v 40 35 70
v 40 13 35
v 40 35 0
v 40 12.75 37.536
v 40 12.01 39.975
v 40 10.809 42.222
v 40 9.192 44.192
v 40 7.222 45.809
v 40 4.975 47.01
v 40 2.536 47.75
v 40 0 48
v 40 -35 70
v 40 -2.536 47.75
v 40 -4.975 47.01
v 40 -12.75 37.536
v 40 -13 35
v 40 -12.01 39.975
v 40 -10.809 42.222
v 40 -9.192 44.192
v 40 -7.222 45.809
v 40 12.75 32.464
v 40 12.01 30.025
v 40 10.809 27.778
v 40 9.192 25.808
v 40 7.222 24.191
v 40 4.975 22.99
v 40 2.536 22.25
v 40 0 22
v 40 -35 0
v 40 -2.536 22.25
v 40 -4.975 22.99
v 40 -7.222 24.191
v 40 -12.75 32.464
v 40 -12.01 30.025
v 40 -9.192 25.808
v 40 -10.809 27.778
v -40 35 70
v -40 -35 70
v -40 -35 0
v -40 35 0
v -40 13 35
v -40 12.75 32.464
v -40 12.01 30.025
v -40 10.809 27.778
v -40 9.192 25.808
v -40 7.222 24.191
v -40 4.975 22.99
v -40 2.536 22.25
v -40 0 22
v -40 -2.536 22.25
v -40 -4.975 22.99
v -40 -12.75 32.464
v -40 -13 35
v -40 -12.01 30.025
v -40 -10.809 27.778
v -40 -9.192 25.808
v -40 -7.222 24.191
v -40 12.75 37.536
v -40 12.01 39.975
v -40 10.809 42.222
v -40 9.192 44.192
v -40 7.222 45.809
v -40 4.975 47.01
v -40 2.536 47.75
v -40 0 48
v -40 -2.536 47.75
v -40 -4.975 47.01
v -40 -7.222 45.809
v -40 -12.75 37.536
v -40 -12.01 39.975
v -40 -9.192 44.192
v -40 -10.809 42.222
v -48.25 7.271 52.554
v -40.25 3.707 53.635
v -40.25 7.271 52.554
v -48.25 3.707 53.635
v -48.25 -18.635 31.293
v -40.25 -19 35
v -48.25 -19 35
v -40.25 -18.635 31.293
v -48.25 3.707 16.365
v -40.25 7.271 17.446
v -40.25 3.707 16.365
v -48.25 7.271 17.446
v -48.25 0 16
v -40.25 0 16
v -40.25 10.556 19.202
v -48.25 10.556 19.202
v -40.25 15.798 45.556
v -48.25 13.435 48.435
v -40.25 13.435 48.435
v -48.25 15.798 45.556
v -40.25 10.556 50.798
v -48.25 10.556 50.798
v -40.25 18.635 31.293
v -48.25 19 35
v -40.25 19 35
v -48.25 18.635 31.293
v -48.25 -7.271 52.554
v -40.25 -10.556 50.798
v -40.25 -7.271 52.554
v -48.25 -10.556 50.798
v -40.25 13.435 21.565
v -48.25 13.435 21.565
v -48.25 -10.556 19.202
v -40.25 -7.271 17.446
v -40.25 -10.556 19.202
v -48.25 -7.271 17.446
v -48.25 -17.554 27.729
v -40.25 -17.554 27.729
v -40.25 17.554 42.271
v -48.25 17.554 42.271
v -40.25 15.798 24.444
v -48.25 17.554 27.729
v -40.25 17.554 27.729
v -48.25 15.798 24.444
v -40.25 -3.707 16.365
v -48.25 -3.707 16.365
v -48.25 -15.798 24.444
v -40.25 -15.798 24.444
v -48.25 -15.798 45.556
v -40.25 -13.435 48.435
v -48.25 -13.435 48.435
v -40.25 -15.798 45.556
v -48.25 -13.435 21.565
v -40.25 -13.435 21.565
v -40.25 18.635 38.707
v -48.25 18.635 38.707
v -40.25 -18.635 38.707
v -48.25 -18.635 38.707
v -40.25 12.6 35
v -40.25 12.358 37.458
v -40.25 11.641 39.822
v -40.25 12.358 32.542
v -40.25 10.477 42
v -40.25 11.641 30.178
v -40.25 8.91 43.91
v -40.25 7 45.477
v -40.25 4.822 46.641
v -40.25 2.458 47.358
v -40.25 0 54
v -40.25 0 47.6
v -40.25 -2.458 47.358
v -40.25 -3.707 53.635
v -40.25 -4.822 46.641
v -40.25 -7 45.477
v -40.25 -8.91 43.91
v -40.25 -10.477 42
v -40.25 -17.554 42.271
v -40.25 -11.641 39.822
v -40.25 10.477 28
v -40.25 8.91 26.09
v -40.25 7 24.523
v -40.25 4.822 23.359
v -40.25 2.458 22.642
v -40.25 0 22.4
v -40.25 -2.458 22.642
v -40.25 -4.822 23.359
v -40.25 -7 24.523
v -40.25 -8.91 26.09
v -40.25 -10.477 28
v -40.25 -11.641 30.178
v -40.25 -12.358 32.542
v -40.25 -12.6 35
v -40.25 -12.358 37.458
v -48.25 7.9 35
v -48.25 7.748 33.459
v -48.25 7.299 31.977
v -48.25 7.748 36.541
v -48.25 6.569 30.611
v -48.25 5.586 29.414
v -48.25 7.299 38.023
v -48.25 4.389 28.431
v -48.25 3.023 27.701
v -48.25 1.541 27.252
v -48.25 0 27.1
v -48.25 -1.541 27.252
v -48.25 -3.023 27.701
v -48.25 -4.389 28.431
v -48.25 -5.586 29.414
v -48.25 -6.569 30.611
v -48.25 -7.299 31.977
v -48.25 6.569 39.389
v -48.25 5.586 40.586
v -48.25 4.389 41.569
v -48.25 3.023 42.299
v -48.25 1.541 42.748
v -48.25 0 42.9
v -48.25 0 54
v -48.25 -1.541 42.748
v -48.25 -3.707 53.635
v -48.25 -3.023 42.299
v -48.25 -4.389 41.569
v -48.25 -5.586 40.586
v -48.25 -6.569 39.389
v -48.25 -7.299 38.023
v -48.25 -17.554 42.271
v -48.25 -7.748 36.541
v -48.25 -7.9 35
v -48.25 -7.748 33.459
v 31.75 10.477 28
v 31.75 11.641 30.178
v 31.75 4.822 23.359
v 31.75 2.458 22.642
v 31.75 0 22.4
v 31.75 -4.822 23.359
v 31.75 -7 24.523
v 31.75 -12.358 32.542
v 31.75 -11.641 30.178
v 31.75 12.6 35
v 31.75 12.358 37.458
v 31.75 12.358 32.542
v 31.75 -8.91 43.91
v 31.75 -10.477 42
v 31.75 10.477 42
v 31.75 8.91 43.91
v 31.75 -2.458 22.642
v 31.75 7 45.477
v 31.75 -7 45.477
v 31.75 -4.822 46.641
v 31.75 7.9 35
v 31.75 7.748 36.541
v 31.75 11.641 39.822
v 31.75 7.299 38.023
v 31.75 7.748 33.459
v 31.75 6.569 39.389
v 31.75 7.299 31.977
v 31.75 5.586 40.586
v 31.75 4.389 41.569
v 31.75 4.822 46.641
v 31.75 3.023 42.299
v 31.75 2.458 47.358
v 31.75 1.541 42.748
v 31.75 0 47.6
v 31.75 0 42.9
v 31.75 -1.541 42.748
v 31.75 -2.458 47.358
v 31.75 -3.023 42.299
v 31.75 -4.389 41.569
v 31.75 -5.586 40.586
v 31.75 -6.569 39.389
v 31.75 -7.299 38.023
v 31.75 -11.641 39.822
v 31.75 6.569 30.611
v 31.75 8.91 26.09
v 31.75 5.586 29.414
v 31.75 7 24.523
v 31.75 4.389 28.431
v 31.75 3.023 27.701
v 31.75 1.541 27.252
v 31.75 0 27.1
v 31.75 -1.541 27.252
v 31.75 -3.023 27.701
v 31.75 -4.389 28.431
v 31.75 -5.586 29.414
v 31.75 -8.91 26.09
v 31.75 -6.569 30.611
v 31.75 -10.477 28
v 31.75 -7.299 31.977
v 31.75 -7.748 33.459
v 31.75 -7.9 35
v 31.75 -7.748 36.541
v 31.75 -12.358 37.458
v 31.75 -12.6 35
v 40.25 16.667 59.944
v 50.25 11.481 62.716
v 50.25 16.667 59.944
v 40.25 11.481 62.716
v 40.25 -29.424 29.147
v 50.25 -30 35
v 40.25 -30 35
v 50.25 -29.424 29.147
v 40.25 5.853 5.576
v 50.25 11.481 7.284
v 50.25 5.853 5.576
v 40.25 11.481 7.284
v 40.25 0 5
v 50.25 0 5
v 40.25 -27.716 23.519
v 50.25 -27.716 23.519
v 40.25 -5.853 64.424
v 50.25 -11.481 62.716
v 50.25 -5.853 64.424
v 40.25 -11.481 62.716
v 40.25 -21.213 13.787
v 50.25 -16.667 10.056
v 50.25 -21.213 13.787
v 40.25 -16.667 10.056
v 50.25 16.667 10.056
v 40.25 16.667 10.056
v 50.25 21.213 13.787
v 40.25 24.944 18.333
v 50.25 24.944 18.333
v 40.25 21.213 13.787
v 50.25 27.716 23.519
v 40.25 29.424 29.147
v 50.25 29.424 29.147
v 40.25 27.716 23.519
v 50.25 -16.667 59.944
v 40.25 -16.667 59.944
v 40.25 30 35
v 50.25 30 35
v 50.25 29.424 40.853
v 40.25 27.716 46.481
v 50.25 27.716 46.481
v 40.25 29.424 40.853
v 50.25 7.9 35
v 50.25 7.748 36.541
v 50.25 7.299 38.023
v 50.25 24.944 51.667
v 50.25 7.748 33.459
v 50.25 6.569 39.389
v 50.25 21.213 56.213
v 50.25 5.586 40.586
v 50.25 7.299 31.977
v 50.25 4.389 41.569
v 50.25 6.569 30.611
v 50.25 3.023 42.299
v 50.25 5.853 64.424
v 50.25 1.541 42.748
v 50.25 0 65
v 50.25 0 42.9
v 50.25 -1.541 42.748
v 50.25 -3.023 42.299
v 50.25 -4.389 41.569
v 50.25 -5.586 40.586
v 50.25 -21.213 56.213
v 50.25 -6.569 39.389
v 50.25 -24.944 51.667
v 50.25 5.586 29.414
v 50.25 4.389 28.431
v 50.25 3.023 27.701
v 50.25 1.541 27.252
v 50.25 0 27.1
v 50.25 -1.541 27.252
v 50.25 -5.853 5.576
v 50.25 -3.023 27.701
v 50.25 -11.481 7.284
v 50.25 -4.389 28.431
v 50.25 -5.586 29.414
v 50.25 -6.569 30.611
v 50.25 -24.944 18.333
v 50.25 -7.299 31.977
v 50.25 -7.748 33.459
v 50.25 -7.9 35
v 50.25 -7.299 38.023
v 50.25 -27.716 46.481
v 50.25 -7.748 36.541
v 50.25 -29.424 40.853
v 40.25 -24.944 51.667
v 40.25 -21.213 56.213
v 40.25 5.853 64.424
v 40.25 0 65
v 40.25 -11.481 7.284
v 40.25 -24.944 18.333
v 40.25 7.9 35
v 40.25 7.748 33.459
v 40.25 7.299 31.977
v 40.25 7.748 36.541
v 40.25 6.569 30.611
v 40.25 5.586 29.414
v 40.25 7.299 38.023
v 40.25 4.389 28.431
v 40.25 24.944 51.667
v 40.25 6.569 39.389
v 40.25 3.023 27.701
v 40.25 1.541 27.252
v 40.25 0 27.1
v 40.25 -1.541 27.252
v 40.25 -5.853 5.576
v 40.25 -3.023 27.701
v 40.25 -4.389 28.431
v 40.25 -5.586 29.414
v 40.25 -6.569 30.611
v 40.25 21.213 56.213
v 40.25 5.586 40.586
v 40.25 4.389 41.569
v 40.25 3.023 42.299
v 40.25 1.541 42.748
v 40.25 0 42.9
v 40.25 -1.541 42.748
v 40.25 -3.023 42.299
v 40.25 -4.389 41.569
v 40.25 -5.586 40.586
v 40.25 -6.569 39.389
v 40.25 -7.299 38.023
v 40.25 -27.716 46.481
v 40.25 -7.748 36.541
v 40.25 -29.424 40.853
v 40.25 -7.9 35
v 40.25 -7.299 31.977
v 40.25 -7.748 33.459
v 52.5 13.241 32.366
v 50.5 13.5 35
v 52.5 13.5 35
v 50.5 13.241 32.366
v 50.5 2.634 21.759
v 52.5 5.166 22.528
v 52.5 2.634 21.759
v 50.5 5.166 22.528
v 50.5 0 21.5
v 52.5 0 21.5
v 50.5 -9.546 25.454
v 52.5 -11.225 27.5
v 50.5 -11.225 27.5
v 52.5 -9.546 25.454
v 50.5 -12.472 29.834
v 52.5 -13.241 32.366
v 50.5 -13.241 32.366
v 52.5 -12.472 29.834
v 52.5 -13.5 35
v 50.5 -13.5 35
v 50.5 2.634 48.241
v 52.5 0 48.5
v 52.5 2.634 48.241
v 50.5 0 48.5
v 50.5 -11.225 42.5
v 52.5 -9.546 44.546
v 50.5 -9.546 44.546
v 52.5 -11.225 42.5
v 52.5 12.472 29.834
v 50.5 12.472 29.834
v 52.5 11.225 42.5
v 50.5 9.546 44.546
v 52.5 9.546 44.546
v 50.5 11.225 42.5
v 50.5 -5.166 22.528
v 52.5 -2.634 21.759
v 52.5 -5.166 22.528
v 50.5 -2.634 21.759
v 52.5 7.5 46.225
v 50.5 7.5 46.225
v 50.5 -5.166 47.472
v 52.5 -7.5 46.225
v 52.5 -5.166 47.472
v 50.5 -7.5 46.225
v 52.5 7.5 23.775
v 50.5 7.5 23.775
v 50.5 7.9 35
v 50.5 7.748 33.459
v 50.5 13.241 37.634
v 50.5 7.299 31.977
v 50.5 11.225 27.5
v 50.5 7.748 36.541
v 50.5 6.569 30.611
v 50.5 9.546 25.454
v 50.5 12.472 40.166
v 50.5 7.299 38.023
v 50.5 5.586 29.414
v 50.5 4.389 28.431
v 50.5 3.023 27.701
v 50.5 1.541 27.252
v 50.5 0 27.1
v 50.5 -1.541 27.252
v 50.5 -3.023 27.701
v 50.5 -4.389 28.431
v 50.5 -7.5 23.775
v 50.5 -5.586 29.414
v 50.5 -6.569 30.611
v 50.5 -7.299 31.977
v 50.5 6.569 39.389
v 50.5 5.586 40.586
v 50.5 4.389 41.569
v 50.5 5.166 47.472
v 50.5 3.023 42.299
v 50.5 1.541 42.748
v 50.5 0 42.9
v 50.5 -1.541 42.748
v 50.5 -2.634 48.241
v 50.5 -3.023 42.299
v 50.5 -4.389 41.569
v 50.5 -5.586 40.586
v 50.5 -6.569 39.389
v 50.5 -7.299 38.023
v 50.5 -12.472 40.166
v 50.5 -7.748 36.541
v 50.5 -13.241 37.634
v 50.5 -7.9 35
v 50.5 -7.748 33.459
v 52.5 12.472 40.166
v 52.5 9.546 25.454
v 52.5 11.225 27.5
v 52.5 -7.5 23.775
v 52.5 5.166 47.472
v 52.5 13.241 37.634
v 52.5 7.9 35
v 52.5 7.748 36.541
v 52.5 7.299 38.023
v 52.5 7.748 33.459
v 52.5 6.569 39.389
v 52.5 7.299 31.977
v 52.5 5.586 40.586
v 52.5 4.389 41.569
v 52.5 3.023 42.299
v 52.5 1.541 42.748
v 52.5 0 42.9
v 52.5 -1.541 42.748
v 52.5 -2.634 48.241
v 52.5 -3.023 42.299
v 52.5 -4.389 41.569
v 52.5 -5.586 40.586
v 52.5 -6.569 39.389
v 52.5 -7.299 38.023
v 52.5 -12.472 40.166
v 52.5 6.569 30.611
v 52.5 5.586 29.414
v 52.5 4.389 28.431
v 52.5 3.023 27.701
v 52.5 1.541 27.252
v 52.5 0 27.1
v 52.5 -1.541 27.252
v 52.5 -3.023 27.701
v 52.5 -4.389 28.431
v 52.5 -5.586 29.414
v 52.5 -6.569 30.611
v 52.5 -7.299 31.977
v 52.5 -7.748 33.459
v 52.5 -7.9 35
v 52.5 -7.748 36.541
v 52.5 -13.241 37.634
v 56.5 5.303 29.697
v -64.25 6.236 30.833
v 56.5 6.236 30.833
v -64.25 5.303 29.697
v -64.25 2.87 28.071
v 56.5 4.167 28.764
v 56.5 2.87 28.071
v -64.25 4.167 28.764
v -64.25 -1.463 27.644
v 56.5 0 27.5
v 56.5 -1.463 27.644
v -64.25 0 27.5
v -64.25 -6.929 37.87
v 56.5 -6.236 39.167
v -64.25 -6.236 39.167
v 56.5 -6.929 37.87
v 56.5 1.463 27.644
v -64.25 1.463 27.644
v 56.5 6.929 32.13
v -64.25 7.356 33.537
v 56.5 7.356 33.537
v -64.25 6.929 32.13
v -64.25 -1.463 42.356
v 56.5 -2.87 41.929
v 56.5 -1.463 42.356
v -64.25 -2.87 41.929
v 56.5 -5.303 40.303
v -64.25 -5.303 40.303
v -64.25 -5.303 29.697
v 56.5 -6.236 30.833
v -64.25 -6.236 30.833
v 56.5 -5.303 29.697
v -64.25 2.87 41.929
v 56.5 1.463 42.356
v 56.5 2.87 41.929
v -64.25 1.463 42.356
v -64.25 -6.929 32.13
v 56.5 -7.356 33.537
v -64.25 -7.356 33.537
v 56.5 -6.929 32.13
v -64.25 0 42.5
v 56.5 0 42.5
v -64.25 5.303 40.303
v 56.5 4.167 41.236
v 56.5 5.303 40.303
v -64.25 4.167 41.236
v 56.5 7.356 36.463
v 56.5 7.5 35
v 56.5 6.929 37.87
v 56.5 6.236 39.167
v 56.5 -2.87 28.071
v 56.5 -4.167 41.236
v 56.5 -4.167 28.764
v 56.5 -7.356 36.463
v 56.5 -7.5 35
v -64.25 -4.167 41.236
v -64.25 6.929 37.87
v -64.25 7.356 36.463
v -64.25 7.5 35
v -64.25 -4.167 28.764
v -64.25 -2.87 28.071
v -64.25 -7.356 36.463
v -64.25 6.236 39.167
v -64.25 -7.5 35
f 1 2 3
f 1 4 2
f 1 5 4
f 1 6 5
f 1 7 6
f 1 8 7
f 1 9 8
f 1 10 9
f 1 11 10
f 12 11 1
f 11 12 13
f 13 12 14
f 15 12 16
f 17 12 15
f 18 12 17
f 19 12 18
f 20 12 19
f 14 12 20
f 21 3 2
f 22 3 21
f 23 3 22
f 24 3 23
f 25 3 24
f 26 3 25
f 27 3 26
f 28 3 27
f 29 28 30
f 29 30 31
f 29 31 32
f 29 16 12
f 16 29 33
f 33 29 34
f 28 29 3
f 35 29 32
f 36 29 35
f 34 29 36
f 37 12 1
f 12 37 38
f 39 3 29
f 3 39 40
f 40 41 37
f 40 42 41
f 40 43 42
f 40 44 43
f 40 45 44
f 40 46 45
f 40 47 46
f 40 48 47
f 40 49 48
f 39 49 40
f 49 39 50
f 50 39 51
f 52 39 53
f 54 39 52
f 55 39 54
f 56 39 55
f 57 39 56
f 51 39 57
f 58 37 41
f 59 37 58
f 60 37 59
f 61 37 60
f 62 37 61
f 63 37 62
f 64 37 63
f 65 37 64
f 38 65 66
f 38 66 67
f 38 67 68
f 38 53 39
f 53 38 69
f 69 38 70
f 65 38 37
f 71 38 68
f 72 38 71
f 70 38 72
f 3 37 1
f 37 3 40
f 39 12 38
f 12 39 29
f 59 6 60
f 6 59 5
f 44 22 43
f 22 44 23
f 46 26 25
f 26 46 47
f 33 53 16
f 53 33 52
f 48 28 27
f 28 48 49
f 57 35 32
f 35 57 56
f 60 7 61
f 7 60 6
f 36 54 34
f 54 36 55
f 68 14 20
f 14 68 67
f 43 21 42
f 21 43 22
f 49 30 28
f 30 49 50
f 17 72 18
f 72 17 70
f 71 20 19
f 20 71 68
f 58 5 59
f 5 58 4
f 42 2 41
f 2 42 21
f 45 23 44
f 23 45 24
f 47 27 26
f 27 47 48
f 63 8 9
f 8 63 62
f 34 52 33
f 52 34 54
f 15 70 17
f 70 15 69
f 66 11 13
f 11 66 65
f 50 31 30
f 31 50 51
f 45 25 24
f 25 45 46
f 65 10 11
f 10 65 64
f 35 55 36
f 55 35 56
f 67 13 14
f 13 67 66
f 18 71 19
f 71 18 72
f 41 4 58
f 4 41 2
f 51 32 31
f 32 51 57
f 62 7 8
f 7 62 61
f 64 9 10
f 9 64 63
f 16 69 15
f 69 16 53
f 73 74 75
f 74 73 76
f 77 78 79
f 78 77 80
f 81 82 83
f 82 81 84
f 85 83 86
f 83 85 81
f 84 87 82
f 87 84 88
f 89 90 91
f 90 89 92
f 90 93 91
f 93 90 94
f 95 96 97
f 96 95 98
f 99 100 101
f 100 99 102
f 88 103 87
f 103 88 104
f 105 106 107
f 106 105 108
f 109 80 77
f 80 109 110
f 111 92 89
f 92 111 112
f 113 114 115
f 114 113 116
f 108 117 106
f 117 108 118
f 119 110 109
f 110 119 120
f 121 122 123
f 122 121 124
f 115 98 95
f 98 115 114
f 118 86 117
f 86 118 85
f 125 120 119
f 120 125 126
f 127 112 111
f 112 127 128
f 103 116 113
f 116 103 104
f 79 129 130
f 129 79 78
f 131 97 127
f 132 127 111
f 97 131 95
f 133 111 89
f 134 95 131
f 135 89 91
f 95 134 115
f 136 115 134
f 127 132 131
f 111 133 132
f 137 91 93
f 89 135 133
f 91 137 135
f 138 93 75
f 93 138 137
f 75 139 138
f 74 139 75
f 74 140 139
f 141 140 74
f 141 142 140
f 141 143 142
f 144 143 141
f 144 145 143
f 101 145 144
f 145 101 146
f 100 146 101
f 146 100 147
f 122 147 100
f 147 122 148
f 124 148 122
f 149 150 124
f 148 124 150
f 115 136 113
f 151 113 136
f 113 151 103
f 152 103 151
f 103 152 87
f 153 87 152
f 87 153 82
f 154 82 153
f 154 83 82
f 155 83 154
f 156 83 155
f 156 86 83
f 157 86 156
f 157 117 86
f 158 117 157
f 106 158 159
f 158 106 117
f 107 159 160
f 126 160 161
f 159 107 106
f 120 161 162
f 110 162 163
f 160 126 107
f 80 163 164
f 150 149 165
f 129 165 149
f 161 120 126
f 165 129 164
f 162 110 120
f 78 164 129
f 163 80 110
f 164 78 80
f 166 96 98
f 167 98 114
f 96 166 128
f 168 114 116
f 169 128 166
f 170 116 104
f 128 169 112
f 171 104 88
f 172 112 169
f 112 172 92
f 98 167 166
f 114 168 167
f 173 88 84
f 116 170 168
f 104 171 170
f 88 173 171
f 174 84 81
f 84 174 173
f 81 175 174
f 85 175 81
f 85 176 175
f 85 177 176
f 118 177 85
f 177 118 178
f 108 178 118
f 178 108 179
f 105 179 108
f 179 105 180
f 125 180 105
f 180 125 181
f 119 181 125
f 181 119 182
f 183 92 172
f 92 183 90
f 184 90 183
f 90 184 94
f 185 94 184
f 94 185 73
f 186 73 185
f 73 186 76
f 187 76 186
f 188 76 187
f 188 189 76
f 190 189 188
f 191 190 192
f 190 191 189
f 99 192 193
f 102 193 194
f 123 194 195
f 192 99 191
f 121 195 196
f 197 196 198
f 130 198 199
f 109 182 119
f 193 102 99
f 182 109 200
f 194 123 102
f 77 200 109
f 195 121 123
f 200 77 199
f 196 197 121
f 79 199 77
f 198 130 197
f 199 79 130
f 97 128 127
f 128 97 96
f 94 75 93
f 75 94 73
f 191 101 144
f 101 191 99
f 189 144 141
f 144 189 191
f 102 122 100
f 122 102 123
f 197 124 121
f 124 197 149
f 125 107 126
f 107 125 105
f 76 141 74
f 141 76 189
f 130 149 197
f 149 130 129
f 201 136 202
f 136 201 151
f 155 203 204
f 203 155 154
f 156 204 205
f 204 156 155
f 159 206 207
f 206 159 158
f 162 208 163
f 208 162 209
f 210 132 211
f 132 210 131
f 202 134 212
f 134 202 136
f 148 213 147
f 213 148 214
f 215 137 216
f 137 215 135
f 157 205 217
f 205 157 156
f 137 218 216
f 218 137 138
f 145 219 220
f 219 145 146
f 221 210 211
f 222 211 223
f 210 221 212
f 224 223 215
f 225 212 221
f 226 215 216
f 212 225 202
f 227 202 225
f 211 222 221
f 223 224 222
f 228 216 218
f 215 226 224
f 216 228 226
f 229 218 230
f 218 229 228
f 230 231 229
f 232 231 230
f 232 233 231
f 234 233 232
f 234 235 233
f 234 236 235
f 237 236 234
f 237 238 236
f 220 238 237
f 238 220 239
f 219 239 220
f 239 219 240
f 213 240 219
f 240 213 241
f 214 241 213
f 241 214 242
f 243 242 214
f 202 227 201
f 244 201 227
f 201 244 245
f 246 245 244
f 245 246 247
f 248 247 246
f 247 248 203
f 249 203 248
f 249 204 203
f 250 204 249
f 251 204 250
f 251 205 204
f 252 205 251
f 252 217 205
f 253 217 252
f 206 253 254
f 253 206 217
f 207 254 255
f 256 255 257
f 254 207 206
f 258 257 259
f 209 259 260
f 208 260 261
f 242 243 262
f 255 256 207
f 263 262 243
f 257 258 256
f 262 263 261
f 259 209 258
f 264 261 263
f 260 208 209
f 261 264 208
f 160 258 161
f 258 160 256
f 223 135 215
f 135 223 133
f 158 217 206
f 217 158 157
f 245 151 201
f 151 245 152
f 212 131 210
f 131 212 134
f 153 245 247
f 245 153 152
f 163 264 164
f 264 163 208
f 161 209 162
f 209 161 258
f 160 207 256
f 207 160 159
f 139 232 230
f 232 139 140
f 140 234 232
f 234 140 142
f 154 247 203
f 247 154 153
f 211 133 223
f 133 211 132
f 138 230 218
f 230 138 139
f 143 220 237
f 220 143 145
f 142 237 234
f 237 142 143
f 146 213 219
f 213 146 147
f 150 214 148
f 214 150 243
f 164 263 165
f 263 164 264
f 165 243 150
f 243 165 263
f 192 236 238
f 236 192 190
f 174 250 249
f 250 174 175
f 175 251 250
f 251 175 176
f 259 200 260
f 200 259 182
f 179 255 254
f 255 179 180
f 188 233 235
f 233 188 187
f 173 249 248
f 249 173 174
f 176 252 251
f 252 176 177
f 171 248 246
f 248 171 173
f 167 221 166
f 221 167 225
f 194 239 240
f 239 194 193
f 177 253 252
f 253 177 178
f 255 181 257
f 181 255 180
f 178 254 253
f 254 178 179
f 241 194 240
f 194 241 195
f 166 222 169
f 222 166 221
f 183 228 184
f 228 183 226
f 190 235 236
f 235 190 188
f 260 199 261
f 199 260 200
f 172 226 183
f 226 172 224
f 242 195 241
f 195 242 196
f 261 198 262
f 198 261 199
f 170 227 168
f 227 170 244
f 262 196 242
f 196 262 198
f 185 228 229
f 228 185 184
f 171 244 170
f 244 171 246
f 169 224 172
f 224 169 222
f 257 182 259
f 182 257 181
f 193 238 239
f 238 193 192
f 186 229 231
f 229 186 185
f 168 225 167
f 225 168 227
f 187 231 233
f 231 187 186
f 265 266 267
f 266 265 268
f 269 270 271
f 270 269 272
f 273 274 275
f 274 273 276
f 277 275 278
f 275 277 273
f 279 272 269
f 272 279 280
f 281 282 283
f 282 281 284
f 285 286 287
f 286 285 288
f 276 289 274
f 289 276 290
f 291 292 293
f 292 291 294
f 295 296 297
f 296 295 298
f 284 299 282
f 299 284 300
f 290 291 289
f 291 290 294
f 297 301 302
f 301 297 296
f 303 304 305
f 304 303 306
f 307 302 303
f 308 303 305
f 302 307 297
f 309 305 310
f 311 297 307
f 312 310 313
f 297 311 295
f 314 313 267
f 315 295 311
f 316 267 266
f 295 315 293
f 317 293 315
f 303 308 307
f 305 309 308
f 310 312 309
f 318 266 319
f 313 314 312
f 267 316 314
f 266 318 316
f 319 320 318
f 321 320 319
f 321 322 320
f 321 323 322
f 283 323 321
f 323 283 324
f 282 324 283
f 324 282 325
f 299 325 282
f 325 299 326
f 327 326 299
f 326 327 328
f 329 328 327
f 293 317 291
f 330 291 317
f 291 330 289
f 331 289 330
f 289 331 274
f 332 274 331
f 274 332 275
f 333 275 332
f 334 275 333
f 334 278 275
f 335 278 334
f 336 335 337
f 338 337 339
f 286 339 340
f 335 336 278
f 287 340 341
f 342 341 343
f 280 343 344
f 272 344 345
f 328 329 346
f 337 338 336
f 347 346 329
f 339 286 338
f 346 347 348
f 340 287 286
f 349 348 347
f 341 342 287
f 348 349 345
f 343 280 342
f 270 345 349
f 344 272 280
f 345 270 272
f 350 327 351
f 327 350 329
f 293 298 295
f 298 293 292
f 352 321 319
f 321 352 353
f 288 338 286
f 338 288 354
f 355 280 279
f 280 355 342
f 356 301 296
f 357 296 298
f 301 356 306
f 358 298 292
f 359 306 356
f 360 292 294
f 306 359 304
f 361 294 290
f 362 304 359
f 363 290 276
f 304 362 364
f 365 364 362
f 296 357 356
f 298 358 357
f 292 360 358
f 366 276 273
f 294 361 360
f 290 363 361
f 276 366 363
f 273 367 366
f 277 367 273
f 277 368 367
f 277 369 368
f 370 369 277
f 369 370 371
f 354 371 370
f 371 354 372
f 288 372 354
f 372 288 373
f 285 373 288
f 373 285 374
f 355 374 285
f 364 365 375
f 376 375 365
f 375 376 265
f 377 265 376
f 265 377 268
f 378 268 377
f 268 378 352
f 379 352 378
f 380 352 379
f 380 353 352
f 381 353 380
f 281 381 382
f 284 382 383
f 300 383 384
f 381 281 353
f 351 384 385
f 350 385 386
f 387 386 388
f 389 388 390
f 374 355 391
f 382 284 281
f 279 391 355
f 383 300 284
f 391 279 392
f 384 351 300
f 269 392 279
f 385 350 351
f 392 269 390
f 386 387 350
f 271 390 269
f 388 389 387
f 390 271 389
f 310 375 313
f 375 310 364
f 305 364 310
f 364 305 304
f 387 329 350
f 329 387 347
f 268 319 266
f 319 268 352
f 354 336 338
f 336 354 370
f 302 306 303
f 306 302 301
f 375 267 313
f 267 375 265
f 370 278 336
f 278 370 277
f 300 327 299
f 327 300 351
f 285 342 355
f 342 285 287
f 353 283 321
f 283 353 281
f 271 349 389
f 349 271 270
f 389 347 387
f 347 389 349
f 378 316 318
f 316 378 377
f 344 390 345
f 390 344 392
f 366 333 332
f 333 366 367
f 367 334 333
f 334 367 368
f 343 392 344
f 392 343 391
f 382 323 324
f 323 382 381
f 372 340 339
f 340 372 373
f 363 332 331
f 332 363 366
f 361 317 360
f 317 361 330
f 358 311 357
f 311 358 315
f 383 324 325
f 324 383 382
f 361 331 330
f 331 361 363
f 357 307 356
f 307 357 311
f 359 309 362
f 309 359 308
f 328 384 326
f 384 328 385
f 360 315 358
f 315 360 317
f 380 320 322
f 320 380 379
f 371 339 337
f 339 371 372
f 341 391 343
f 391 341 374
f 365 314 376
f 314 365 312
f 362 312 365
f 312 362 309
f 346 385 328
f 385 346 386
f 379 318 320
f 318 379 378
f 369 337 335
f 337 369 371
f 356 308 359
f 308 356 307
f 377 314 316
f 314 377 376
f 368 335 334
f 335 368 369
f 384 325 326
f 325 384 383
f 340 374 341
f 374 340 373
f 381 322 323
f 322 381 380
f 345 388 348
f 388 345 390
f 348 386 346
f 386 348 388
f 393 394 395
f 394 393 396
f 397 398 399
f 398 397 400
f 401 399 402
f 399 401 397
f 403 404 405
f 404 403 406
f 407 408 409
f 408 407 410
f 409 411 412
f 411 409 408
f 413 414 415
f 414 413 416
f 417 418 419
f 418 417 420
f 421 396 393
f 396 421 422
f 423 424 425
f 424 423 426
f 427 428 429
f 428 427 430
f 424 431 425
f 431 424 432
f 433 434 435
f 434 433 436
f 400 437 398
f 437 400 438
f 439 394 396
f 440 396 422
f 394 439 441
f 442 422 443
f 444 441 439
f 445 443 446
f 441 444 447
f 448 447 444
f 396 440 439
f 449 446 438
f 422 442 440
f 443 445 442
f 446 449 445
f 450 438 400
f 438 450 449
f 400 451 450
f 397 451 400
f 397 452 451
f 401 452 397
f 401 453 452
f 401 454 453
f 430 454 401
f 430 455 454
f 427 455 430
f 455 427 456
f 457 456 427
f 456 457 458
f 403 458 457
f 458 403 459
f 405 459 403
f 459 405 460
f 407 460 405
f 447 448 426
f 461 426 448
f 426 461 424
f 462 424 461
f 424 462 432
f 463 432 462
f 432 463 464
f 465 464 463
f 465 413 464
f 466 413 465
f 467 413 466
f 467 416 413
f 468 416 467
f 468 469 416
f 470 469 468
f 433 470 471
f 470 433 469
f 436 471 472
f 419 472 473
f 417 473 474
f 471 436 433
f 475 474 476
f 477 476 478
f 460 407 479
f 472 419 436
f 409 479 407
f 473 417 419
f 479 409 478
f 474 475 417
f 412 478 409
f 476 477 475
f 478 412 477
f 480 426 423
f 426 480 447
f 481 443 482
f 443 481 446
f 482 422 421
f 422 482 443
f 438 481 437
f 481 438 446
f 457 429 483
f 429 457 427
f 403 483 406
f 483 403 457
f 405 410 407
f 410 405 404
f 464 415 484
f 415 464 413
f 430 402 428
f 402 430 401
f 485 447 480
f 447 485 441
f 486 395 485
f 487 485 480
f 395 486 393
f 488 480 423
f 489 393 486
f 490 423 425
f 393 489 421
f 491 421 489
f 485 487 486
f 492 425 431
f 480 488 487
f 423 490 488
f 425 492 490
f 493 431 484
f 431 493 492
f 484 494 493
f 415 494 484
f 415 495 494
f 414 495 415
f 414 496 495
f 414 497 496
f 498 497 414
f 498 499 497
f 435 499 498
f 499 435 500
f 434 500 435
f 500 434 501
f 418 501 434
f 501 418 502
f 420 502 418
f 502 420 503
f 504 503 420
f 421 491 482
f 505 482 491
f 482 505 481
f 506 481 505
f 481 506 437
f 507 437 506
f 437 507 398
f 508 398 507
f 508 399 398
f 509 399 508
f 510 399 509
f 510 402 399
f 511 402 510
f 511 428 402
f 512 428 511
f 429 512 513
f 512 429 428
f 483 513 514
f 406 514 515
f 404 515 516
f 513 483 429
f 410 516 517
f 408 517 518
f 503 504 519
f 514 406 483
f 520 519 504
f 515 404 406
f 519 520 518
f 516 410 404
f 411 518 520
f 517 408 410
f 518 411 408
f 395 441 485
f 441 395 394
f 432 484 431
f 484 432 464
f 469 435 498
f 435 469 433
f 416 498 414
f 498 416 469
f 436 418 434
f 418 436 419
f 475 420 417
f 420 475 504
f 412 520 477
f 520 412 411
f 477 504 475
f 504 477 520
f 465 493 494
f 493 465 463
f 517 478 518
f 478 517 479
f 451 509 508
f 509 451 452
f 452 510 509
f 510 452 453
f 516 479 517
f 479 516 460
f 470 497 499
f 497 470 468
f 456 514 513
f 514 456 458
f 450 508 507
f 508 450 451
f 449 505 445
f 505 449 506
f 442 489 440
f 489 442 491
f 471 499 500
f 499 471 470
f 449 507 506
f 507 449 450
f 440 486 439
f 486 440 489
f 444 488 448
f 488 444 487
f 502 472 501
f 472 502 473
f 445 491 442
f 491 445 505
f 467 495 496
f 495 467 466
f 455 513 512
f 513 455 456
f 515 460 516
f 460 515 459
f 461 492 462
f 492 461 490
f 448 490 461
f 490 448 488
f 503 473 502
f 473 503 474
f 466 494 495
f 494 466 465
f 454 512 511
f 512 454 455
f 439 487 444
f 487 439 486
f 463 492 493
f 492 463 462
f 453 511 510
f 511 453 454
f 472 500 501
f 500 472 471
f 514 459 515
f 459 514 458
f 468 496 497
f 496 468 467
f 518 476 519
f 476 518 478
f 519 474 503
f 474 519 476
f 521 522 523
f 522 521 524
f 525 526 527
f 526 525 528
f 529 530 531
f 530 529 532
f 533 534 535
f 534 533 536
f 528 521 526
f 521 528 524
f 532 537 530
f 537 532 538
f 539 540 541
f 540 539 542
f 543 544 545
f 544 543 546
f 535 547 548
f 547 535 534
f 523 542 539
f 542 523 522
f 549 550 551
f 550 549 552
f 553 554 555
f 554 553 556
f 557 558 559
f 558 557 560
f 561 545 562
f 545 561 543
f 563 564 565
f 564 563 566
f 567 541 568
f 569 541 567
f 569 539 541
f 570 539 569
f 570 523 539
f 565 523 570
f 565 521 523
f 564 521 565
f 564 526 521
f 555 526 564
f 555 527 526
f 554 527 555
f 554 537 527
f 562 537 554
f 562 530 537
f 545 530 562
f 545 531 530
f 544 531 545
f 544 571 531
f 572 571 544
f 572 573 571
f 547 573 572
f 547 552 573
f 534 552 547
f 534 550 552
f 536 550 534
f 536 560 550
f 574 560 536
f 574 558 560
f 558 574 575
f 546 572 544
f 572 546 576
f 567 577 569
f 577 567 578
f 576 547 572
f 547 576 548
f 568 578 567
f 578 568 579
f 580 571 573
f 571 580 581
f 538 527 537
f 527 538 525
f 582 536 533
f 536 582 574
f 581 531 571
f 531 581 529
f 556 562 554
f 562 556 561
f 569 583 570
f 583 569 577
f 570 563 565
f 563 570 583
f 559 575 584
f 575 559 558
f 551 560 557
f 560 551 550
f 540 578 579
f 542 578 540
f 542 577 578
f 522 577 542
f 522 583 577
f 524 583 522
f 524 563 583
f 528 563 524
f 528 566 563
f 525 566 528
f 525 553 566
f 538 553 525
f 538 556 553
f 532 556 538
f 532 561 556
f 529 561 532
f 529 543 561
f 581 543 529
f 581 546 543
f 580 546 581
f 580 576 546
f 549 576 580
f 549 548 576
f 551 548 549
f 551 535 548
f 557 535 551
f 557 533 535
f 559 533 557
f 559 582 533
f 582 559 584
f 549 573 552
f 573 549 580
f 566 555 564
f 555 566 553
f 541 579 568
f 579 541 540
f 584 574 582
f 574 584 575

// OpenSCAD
$fn = 32;

// ------------------------------------------------------------------------
// Bushed housing: 80 x 70 x 70 mm housing, bushing d25.2
// Every part is its own module, assembly() places them once.
// ------------------------------------------------------------------------

// --- part 1 ---
module housing() {
  difference() {
    translate([-40, -35, 0]) cube([80, 70, 70]);
    translate([0, 0, 35]) rotate([0, 90, 0]) cylinder(h = 82, d = 26, center = true);
  }
}

// --- part 2 ---
module bushing() {
  difference() {
    union() {
      cylinder(h = 8, d = 38);
      translate([0, 0, 8]) cylinder(h = 72, d = 25.2);
    }
    translate([0, 0, -1]) cylinder(h = 82, d = 15.8);
  }
}

// --- part 3 ---
module shaft() {
  translate([0, 0, -60.375]) cylinder(h = 120.75, d = 15);
}

// --- part 4 ---
module cover() {
  difference() {
    cylinder(h = 10, d = 60);
    translate([0, 0, -1]) cylinder(h = 12, d = 15.8);
  }
}

// --- part 5 ---
module washer() {
  difference() {
      translate([0, 0, 0]) cylinder(h = 2, d = 27);
      translate([0, 0, -1]) cylinder(h = 4, d = 15.8);
    }
}

// --- assembly ---
module assembly() {
  translate([0, 0, 0]) rotate([0, 0, 0]) housing();
  translate([-48.25, 0, 35]) rotate([0, 90, 0]) bushing();
  translate([-3.875, 0, 35]) rotate([0, 90, 0]) shaft();
  translate([40.25, 0, 35]) rotate([0, 90, 0]) cover();
  translate([50.5, 0, 35]) rotate([0, 90, 0]) washer();
}

assembly();
